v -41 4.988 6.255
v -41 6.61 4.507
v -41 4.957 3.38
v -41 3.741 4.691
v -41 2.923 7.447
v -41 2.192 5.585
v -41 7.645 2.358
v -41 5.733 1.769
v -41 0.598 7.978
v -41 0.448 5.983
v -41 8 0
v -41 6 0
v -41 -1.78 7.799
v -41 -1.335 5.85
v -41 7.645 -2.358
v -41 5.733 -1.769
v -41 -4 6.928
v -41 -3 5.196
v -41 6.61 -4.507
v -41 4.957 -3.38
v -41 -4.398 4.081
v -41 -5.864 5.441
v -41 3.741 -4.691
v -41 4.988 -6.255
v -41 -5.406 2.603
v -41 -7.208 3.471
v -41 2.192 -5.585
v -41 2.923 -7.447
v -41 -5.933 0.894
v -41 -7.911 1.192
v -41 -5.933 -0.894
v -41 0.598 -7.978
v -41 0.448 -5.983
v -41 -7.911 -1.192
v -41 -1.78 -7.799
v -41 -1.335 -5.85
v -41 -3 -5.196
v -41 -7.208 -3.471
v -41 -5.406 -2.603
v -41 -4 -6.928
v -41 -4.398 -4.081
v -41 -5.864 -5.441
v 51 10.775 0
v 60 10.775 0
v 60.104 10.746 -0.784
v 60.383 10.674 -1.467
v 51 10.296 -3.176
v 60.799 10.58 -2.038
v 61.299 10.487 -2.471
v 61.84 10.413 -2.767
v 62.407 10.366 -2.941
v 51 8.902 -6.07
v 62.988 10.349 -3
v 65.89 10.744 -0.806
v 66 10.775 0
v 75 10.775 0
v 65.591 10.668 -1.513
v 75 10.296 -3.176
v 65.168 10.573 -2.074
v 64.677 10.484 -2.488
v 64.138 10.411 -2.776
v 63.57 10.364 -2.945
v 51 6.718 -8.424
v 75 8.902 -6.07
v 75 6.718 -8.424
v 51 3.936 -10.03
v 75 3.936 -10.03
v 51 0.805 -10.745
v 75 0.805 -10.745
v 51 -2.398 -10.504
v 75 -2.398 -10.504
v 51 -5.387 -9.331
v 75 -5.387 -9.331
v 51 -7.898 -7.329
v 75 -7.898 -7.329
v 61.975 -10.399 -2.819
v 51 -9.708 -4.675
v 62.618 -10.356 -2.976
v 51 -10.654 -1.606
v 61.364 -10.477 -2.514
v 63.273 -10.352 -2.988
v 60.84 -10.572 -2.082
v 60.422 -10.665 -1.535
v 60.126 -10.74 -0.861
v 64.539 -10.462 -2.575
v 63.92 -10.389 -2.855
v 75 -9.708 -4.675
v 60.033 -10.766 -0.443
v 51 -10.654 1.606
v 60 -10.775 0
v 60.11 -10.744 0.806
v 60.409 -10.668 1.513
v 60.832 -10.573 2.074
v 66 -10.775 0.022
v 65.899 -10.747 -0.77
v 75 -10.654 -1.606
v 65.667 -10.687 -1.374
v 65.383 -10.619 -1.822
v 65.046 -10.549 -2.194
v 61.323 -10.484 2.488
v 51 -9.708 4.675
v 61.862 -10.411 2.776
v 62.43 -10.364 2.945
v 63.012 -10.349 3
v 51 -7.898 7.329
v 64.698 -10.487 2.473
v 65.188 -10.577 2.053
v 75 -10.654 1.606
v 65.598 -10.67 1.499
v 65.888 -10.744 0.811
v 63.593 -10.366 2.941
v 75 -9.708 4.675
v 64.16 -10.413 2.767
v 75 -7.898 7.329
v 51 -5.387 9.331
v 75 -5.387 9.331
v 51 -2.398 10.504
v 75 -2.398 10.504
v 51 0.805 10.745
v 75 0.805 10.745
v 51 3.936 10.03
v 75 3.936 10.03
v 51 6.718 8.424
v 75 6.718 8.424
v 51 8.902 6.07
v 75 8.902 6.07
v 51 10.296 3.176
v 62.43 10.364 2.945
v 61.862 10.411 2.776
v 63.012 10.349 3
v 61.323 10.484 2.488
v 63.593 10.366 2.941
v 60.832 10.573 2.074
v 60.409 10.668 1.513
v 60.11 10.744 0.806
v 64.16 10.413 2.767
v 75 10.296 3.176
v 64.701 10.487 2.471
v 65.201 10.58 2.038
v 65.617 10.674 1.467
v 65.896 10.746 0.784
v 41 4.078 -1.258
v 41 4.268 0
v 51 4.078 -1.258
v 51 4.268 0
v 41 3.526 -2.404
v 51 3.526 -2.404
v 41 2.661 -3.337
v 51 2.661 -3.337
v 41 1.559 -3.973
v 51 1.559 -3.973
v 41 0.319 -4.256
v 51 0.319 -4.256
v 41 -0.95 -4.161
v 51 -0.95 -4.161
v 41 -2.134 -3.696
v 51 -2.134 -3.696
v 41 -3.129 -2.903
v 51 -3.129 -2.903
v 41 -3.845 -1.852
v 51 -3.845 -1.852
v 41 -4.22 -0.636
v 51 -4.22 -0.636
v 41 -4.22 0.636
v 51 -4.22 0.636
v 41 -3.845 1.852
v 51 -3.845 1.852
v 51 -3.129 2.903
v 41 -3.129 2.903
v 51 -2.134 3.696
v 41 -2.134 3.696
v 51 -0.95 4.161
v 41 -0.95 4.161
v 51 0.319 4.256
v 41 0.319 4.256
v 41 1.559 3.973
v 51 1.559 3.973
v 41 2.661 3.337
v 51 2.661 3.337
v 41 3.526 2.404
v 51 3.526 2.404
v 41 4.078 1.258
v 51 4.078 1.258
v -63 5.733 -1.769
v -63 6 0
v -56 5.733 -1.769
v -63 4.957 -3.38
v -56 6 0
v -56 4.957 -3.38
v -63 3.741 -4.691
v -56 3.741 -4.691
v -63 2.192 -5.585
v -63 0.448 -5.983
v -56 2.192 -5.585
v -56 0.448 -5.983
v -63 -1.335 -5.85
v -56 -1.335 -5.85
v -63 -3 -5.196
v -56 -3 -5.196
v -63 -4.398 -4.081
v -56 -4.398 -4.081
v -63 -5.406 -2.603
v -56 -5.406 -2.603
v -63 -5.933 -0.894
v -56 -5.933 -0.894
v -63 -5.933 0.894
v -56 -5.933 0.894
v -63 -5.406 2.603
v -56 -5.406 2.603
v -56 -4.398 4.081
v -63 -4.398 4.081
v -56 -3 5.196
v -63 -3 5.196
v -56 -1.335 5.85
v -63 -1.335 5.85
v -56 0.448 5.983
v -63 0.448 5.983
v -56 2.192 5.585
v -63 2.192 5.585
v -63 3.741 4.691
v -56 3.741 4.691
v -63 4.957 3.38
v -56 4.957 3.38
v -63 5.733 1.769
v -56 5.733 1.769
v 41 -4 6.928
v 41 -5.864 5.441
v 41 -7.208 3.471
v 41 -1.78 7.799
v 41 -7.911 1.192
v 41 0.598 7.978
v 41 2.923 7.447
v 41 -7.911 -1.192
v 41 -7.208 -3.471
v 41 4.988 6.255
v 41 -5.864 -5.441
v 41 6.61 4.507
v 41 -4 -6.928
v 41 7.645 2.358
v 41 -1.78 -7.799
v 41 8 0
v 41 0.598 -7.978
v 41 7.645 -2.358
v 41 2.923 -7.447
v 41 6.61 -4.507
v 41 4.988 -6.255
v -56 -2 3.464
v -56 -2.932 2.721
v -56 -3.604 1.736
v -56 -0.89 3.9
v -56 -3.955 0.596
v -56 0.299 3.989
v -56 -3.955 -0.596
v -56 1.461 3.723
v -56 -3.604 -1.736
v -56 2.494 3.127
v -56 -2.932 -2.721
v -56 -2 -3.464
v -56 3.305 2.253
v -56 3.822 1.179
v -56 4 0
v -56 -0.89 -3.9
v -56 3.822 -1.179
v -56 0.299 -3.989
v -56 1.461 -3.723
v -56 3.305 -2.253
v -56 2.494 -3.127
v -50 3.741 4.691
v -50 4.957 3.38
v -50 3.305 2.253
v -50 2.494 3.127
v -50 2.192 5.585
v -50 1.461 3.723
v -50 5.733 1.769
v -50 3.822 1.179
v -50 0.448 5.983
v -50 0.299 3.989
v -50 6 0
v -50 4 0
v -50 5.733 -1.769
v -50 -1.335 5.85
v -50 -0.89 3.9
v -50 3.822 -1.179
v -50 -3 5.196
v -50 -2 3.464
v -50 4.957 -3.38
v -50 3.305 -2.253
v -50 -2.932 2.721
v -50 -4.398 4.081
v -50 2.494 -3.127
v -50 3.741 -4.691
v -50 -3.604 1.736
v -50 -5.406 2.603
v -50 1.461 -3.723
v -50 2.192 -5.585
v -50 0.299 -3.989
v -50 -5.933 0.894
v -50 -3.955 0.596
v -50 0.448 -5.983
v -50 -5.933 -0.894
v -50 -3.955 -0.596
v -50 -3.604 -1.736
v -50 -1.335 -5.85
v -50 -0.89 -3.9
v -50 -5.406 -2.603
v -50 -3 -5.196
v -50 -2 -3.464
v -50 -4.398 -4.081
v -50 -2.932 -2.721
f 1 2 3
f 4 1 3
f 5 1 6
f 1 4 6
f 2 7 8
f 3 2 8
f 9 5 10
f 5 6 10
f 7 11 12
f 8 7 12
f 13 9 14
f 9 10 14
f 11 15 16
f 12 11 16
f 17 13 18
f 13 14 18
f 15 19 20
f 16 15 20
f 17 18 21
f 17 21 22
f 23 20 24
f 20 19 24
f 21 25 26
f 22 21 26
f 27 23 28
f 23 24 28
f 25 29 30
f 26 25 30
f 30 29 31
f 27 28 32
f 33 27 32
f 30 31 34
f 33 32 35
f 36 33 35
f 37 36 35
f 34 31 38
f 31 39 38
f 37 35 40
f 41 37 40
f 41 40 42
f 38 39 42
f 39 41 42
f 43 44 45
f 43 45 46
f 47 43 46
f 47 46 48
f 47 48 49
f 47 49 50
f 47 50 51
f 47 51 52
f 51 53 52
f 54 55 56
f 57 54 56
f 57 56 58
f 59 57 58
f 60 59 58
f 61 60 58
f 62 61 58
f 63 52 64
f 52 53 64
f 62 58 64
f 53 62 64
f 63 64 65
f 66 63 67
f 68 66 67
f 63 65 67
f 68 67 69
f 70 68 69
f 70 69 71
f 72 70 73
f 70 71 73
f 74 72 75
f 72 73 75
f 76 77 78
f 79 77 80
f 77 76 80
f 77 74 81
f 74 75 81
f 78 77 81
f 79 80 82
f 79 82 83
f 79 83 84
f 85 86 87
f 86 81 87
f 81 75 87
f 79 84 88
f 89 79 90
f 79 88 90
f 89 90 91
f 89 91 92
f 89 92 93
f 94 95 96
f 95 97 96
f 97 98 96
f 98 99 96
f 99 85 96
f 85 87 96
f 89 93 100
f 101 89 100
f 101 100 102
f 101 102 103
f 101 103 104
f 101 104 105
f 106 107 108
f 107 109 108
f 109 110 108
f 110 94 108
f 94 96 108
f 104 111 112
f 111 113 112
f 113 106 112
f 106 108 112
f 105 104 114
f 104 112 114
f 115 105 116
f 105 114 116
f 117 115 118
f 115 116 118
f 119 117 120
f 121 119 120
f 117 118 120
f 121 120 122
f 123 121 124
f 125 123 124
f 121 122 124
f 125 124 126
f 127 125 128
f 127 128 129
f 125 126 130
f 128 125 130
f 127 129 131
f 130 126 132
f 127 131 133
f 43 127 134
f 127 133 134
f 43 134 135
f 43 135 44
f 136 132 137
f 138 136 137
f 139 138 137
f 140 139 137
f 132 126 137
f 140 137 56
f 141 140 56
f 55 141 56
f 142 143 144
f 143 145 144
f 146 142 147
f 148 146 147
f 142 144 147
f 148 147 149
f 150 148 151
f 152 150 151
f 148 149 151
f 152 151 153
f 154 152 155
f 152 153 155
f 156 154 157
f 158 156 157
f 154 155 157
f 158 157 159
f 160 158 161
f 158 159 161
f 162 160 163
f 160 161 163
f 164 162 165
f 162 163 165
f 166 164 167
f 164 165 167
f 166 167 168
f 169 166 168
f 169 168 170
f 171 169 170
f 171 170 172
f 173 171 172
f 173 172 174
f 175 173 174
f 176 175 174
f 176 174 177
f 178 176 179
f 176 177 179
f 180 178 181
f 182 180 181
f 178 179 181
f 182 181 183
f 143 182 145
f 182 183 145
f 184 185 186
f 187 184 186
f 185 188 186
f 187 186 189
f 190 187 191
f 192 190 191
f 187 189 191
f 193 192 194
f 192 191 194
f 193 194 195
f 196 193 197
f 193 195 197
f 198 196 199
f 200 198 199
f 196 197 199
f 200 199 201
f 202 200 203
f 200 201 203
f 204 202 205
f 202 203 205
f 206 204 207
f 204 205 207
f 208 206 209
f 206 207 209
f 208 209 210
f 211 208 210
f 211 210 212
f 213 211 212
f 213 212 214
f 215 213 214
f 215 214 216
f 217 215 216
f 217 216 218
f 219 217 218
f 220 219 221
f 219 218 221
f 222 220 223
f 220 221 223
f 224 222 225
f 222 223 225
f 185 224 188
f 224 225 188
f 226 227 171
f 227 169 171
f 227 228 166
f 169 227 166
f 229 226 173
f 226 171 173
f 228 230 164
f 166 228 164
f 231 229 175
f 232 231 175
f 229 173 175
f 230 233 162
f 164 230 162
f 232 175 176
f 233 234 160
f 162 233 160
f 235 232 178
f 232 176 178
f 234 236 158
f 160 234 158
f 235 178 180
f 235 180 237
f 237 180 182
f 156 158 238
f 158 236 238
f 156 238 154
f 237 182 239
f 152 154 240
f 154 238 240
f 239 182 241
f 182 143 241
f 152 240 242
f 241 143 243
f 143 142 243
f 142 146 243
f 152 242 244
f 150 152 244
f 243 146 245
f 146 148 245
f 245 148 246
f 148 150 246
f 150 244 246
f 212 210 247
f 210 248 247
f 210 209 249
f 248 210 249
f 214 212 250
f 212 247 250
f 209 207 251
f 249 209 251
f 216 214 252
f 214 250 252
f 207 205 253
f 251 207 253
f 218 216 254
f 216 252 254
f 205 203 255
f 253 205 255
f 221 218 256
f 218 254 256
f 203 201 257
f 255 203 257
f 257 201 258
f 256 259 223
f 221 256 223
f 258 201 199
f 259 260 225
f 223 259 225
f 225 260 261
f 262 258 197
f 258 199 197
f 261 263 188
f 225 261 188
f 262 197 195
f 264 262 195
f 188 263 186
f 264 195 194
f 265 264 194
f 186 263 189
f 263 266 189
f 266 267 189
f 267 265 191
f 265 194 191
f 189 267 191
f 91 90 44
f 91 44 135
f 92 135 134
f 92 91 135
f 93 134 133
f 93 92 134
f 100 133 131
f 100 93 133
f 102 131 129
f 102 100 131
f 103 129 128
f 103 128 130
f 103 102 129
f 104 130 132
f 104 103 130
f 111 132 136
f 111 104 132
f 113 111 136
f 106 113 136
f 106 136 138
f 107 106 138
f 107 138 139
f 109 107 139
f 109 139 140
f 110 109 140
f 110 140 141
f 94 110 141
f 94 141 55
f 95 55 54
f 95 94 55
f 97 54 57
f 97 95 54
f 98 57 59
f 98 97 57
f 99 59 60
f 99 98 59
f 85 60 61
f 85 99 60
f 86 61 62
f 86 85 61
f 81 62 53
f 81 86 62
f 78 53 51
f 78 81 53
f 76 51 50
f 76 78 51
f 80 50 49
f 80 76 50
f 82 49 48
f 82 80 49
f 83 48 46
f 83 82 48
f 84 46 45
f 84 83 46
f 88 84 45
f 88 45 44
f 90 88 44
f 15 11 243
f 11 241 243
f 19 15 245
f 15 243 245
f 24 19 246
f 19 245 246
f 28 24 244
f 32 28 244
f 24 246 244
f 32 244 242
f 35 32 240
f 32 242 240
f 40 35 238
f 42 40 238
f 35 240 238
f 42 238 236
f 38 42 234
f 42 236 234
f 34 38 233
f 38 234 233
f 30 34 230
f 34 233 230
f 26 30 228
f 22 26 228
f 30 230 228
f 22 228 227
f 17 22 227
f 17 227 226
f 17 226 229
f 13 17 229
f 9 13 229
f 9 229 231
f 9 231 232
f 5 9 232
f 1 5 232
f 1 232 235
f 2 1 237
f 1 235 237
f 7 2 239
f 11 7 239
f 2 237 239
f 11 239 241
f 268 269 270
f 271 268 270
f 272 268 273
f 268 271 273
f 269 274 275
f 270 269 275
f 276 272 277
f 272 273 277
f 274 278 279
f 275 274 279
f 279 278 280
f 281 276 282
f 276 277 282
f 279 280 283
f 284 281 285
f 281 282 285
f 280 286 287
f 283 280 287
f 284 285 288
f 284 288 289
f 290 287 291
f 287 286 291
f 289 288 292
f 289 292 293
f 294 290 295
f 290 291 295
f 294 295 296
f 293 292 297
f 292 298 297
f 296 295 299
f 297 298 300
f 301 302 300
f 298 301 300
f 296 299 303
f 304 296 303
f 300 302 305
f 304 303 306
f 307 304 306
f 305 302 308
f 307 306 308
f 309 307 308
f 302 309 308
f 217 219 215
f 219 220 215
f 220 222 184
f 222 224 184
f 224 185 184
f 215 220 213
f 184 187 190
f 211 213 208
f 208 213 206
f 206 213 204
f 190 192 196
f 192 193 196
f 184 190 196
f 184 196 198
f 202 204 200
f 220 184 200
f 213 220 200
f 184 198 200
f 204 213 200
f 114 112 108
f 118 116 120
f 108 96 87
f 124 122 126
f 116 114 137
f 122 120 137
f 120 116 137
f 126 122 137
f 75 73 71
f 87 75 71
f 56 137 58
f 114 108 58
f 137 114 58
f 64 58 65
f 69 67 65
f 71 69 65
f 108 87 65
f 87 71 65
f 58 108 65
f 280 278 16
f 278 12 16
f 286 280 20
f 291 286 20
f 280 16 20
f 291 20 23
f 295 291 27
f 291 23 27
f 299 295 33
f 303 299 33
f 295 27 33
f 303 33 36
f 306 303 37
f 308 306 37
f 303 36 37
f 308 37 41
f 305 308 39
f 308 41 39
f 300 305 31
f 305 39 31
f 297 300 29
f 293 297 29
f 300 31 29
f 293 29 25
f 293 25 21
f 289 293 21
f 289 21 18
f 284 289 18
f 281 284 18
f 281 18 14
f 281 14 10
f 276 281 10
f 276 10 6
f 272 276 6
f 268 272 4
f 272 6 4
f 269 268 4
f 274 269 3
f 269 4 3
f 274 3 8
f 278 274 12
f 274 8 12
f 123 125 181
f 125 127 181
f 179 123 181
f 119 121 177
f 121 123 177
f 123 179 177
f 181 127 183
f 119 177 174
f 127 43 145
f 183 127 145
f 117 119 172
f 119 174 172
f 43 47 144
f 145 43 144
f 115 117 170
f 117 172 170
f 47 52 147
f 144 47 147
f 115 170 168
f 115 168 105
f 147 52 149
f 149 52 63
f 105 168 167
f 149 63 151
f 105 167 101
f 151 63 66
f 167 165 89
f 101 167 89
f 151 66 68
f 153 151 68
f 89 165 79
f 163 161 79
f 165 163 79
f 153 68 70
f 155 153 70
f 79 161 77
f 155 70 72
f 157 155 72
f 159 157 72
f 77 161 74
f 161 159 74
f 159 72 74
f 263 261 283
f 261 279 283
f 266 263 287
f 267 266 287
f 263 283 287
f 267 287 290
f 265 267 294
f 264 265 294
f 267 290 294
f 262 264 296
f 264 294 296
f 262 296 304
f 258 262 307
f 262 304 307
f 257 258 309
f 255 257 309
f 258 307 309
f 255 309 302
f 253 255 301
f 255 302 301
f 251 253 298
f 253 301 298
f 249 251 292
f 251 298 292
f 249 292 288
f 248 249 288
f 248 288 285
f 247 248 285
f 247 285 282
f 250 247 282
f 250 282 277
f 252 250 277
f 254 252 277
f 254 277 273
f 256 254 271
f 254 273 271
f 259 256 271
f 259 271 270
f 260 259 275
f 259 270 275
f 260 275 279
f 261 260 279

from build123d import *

# Parameters (mm, degrees)
CUT_EXTRUDE1_DEPTH      = 79.774764709
CUT_EXTRUDE1_DEPTH_BACK = 79.774764709
SKETCH2_R               = 3


with BuildPart() as part:
    # Sketch1 → Revolve1 (revolve)
    with BuildSketch(Plane.XY):
        Polygon((41, 4.267874105), (51, 4.267874105), (51, 10.774632754), (75, 10.774632754), (75, 0), (-63, 0), (-63, 6), (-56, 6), (-56, 4), (-50, 4), (-50, 6), (-41, 6), (-41, 8), (41, 8), align=None)
    revolve(axis=Axis((75, 0, 0), (-1, 0, 0)))

    # Sketch2 → Cut-Extrude1 (cut, two sides: drawn at the far end of the back side and taken through both)
    with BuildSketch(Plane(origin=(0, 10.774632754, 0), x_dir=(1, 0, 0), z_dir=(0, 1, 0)).offset(-CUT_EXTRUDE1_DEPTH_BACK)):
        with Locations(Location((63, 0, 0), (0, 0, 180))):
            Circle(SKETCH2_R)
    extrude(amount=CUT_EXTRUDE1_DEPTH + CUT_EXTRUDE1_DEPTH_BACK, mode=Mode.SUBTRACT)


solid = part.part
